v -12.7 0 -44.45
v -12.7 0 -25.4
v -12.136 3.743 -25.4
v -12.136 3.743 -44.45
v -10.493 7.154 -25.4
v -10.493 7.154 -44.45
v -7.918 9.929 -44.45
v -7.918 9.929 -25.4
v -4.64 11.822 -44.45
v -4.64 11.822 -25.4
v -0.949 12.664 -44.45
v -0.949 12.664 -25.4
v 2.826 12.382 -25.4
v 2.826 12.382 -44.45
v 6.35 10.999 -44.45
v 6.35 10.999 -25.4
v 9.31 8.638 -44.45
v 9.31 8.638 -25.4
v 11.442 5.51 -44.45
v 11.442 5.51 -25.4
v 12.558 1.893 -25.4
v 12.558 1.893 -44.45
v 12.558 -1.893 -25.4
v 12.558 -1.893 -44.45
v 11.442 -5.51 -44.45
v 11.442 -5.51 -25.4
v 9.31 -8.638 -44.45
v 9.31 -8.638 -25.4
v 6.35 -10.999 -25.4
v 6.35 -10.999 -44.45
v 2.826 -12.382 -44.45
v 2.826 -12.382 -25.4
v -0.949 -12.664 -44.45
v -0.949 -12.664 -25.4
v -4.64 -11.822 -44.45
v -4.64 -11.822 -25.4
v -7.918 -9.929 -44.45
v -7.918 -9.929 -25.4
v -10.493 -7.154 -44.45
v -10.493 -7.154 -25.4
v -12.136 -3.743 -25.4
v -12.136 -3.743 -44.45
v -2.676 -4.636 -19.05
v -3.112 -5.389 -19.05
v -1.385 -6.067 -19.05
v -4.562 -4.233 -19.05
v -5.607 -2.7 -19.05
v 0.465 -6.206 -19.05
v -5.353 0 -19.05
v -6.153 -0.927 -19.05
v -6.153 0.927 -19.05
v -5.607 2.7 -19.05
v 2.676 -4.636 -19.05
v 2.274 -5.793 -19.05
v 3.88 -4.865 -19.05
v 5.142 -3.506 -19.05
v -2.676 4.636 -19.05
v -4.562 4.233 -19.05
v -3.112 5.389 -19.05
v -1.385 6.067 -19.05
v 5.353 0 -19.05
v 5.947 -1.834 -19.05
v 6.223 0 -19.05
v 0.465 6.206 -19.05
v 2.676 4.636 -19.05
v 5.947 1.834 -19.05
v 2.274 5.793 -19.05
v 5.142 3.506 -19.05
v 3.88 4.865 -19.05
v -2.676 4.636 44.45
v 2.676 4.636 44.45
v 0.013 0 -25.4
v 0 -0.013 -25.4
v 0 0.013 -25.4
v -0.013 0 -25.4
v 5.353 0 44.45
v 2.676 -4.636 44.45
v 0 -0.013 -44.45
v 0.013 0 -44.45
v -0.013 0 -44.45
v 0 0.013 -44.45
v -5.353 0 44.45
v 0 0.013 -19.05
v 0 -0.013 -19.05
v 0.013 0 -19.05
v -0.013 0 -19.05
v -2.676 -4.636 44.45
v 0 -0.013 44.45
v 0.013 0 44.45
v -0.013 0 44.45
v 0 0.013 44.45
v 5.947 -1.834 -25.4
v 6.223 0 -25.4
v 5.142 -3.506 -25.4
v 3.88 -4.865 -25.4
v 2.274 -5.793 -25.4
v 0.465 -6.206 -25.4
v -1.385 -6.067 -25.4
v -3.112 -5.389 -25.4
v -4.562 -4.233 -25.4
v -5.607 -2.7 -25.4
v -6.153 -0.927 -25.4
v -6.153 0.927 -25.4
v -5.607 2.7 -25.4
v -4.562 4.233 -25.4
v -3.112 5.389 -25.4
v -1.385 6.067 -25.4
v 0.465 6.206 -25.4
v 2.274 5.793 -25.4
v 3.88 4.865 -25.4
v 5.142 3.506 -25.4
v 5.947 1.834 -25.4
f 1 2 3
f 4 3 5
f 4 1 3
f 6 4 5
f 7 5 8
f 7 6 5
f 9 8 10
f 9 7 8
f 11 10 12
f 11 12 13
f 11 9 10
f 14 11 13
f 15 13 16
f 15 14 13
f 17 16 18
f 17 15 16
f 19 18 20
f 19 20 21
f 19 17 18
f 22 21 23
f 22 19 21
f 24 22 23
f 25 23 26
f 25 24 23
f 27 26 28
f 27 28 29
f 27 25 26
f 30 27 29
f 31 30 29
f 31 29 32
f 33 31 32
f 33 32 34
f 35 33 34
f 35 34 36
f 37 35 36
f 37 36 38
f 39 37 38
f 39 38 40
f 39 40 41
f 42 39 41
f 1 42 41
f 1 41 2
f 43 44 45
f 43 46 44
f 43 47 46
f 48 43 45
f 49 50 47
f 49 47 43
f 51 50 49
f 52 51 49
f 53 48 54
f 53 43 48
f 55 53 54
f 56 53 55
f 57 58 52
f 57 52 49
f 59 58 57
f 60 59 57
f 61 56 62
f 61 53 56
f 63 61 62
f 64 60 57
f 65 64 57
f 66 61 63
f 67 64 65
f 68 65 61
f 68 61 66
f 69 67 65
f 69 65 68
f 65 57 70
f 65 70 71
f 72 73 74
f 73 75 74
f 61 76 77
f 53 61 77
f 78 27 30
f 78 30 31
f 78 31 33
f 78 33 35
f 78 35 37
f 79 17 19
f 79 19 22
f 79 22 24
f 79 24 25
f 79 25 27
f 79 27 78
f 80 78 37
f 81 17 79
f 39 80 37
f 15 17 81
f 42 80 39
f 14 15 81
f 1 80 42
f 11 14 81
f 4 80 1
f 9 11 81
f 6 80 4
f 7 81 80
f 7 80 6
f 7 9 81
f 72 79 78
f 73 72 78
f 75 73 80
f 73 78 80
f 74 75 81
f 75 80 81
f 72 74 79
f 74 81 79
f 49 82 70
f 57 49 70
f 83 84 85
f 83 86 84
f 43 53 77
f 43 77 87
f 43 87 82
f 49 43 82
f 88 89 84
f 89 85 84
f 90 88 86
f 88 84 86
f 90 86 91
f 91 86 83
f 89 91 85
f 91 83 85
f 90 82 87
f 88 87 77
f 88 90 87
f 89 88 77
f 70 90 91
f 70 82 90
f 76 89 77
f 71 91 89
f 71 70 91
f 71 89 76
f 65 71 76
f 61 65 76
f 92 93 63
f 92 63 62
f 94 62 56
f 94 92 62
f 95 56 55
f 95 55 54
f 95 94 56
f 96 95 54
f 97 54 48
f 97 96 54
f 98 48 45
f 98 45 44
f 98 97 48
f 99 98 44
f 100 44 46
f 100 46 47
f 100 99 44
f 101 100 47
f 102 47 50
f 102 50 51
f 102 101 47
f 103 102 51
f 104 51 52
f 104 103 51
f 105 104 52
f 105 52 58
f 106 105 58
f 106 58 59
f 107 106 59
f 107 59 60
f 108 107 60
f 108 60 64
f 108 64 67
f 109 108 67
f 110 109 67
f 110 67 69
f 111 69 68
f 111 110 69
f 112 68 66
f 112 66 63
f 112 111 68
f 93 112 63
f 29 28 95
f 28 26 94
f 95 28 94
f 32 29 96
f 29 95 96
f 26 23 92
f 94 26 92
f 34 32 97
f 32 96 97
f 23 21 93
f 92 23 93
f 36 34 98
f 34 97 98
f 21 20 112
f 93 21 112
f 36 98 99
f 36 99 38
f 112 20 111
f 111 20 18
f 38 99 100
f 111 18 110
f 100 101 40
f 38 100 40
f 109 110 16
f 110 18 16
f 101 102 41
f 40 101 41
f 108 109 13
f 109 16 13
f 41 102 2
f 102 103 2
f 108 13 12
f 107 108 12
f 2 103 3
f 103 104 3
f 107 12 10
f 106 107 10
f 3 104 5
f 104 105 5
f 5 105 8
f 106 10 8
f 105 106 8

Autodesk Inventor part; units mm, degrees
ref_plane "YZ Plane" through (0, 0, 0) normal (1, 0, 0) x (0, 1, 0)
ref_plane "XZ Plane" through (0, 0, 0) normal (0, 1, 0) x (-1, 0, 0)
ref_plane "XY Plane" through (0, 0, 0) normal (0, 0, 1) x (1, 0, 0)
sketch "Sketch1" plane through (0, 0, 0) normal (0, 0, 1) x (1, 0, 0)
  line L0 (5.4993, 0) -> (2.7496, -4.7625)
  line L1 (2.7496, -4.7625) -> (-2.7496, -4.7625)
  line L2 (-2.7496, -4.7625) -> (-5.4993, 0)
  line L3 (-5.4993, 0) -> (-2.7496, 4.7625)
  line L4 (-2.7496, 4.7625) -> (2.7496, 4.7625)
  line L5 (2.7496, 4.7625) -> (5.4993, 0)
  circle A0 centre (0, 0) radius 0.0127
  dimension "d0" = 9.525
  dimension "d6" = 0.0254
extrude "Extrusion2" add sketch "Sketch1" along normal mid plane 88.9
sketch "Sketch4" plane through (0, 0, -44.45) normal (0, 0, -1) x (-1, 0, 0)
  circle A0 centre (0, 0) radius 0.0127 projected
  circle A1 centre (0, 0) radius 12.7
  dimension "d10" = 25.4
extrude "Extrusion4" add sketch "Sketch4" against normal blind 19.05
thicken "Reduce Hex Shaft" operation add thickness 0.127 both sides no extend neighbours yes toward (0, -1, 0) faces at (0.9165, 4.7625, -2.1167) (4.5827, 1.5875, -2.1167) (3.6662, -3.175, -2.1167) (-3.6662, 3.175, -2.1167) (-4.5827, -1.5875, -2.1167) (-0.9165, -4.7625, -2.1167)
sketch "Sketch5" plane through (0, 0, -25.4) normal (0, 0, 1) x (1, 0, 0)
  circle A0 centre (0, 0) radius 6.35
  dimension "d15" = 12.7
extrude "Extrusion5" add sketch "Sketch5" along normal blind 6.35
thicken "Reduce Base Bushing" operation add thickness 0.127 both sides no extend neighbours yes toward (-0.9967573, 0.0804666, 0) faces at (6.3294, -0.511, -21.1667)
equation "\"d0\" = hexSize"
equation "\"d4\" = length"
equation "\"d13\" = printOffset"
equation "\"d14\" = printOffset"
equation "\"d15\" = bushingForBaseHole"
equation "\"d16\" = sideOfBase"
equation "\"d20\" = printOffset"
equation "\"d21\" = printOffset"
equation "\"hexSize\" = 9.525"
equation "\"length\" = 88.9"
equation "\"printOffset\" = 0.127"
equation "\"bushingForBaseHole\" = 12.7"
equation "\"sideOfBase\" = 6.35"
properties part number "3_8x3-inchHexShaft"
